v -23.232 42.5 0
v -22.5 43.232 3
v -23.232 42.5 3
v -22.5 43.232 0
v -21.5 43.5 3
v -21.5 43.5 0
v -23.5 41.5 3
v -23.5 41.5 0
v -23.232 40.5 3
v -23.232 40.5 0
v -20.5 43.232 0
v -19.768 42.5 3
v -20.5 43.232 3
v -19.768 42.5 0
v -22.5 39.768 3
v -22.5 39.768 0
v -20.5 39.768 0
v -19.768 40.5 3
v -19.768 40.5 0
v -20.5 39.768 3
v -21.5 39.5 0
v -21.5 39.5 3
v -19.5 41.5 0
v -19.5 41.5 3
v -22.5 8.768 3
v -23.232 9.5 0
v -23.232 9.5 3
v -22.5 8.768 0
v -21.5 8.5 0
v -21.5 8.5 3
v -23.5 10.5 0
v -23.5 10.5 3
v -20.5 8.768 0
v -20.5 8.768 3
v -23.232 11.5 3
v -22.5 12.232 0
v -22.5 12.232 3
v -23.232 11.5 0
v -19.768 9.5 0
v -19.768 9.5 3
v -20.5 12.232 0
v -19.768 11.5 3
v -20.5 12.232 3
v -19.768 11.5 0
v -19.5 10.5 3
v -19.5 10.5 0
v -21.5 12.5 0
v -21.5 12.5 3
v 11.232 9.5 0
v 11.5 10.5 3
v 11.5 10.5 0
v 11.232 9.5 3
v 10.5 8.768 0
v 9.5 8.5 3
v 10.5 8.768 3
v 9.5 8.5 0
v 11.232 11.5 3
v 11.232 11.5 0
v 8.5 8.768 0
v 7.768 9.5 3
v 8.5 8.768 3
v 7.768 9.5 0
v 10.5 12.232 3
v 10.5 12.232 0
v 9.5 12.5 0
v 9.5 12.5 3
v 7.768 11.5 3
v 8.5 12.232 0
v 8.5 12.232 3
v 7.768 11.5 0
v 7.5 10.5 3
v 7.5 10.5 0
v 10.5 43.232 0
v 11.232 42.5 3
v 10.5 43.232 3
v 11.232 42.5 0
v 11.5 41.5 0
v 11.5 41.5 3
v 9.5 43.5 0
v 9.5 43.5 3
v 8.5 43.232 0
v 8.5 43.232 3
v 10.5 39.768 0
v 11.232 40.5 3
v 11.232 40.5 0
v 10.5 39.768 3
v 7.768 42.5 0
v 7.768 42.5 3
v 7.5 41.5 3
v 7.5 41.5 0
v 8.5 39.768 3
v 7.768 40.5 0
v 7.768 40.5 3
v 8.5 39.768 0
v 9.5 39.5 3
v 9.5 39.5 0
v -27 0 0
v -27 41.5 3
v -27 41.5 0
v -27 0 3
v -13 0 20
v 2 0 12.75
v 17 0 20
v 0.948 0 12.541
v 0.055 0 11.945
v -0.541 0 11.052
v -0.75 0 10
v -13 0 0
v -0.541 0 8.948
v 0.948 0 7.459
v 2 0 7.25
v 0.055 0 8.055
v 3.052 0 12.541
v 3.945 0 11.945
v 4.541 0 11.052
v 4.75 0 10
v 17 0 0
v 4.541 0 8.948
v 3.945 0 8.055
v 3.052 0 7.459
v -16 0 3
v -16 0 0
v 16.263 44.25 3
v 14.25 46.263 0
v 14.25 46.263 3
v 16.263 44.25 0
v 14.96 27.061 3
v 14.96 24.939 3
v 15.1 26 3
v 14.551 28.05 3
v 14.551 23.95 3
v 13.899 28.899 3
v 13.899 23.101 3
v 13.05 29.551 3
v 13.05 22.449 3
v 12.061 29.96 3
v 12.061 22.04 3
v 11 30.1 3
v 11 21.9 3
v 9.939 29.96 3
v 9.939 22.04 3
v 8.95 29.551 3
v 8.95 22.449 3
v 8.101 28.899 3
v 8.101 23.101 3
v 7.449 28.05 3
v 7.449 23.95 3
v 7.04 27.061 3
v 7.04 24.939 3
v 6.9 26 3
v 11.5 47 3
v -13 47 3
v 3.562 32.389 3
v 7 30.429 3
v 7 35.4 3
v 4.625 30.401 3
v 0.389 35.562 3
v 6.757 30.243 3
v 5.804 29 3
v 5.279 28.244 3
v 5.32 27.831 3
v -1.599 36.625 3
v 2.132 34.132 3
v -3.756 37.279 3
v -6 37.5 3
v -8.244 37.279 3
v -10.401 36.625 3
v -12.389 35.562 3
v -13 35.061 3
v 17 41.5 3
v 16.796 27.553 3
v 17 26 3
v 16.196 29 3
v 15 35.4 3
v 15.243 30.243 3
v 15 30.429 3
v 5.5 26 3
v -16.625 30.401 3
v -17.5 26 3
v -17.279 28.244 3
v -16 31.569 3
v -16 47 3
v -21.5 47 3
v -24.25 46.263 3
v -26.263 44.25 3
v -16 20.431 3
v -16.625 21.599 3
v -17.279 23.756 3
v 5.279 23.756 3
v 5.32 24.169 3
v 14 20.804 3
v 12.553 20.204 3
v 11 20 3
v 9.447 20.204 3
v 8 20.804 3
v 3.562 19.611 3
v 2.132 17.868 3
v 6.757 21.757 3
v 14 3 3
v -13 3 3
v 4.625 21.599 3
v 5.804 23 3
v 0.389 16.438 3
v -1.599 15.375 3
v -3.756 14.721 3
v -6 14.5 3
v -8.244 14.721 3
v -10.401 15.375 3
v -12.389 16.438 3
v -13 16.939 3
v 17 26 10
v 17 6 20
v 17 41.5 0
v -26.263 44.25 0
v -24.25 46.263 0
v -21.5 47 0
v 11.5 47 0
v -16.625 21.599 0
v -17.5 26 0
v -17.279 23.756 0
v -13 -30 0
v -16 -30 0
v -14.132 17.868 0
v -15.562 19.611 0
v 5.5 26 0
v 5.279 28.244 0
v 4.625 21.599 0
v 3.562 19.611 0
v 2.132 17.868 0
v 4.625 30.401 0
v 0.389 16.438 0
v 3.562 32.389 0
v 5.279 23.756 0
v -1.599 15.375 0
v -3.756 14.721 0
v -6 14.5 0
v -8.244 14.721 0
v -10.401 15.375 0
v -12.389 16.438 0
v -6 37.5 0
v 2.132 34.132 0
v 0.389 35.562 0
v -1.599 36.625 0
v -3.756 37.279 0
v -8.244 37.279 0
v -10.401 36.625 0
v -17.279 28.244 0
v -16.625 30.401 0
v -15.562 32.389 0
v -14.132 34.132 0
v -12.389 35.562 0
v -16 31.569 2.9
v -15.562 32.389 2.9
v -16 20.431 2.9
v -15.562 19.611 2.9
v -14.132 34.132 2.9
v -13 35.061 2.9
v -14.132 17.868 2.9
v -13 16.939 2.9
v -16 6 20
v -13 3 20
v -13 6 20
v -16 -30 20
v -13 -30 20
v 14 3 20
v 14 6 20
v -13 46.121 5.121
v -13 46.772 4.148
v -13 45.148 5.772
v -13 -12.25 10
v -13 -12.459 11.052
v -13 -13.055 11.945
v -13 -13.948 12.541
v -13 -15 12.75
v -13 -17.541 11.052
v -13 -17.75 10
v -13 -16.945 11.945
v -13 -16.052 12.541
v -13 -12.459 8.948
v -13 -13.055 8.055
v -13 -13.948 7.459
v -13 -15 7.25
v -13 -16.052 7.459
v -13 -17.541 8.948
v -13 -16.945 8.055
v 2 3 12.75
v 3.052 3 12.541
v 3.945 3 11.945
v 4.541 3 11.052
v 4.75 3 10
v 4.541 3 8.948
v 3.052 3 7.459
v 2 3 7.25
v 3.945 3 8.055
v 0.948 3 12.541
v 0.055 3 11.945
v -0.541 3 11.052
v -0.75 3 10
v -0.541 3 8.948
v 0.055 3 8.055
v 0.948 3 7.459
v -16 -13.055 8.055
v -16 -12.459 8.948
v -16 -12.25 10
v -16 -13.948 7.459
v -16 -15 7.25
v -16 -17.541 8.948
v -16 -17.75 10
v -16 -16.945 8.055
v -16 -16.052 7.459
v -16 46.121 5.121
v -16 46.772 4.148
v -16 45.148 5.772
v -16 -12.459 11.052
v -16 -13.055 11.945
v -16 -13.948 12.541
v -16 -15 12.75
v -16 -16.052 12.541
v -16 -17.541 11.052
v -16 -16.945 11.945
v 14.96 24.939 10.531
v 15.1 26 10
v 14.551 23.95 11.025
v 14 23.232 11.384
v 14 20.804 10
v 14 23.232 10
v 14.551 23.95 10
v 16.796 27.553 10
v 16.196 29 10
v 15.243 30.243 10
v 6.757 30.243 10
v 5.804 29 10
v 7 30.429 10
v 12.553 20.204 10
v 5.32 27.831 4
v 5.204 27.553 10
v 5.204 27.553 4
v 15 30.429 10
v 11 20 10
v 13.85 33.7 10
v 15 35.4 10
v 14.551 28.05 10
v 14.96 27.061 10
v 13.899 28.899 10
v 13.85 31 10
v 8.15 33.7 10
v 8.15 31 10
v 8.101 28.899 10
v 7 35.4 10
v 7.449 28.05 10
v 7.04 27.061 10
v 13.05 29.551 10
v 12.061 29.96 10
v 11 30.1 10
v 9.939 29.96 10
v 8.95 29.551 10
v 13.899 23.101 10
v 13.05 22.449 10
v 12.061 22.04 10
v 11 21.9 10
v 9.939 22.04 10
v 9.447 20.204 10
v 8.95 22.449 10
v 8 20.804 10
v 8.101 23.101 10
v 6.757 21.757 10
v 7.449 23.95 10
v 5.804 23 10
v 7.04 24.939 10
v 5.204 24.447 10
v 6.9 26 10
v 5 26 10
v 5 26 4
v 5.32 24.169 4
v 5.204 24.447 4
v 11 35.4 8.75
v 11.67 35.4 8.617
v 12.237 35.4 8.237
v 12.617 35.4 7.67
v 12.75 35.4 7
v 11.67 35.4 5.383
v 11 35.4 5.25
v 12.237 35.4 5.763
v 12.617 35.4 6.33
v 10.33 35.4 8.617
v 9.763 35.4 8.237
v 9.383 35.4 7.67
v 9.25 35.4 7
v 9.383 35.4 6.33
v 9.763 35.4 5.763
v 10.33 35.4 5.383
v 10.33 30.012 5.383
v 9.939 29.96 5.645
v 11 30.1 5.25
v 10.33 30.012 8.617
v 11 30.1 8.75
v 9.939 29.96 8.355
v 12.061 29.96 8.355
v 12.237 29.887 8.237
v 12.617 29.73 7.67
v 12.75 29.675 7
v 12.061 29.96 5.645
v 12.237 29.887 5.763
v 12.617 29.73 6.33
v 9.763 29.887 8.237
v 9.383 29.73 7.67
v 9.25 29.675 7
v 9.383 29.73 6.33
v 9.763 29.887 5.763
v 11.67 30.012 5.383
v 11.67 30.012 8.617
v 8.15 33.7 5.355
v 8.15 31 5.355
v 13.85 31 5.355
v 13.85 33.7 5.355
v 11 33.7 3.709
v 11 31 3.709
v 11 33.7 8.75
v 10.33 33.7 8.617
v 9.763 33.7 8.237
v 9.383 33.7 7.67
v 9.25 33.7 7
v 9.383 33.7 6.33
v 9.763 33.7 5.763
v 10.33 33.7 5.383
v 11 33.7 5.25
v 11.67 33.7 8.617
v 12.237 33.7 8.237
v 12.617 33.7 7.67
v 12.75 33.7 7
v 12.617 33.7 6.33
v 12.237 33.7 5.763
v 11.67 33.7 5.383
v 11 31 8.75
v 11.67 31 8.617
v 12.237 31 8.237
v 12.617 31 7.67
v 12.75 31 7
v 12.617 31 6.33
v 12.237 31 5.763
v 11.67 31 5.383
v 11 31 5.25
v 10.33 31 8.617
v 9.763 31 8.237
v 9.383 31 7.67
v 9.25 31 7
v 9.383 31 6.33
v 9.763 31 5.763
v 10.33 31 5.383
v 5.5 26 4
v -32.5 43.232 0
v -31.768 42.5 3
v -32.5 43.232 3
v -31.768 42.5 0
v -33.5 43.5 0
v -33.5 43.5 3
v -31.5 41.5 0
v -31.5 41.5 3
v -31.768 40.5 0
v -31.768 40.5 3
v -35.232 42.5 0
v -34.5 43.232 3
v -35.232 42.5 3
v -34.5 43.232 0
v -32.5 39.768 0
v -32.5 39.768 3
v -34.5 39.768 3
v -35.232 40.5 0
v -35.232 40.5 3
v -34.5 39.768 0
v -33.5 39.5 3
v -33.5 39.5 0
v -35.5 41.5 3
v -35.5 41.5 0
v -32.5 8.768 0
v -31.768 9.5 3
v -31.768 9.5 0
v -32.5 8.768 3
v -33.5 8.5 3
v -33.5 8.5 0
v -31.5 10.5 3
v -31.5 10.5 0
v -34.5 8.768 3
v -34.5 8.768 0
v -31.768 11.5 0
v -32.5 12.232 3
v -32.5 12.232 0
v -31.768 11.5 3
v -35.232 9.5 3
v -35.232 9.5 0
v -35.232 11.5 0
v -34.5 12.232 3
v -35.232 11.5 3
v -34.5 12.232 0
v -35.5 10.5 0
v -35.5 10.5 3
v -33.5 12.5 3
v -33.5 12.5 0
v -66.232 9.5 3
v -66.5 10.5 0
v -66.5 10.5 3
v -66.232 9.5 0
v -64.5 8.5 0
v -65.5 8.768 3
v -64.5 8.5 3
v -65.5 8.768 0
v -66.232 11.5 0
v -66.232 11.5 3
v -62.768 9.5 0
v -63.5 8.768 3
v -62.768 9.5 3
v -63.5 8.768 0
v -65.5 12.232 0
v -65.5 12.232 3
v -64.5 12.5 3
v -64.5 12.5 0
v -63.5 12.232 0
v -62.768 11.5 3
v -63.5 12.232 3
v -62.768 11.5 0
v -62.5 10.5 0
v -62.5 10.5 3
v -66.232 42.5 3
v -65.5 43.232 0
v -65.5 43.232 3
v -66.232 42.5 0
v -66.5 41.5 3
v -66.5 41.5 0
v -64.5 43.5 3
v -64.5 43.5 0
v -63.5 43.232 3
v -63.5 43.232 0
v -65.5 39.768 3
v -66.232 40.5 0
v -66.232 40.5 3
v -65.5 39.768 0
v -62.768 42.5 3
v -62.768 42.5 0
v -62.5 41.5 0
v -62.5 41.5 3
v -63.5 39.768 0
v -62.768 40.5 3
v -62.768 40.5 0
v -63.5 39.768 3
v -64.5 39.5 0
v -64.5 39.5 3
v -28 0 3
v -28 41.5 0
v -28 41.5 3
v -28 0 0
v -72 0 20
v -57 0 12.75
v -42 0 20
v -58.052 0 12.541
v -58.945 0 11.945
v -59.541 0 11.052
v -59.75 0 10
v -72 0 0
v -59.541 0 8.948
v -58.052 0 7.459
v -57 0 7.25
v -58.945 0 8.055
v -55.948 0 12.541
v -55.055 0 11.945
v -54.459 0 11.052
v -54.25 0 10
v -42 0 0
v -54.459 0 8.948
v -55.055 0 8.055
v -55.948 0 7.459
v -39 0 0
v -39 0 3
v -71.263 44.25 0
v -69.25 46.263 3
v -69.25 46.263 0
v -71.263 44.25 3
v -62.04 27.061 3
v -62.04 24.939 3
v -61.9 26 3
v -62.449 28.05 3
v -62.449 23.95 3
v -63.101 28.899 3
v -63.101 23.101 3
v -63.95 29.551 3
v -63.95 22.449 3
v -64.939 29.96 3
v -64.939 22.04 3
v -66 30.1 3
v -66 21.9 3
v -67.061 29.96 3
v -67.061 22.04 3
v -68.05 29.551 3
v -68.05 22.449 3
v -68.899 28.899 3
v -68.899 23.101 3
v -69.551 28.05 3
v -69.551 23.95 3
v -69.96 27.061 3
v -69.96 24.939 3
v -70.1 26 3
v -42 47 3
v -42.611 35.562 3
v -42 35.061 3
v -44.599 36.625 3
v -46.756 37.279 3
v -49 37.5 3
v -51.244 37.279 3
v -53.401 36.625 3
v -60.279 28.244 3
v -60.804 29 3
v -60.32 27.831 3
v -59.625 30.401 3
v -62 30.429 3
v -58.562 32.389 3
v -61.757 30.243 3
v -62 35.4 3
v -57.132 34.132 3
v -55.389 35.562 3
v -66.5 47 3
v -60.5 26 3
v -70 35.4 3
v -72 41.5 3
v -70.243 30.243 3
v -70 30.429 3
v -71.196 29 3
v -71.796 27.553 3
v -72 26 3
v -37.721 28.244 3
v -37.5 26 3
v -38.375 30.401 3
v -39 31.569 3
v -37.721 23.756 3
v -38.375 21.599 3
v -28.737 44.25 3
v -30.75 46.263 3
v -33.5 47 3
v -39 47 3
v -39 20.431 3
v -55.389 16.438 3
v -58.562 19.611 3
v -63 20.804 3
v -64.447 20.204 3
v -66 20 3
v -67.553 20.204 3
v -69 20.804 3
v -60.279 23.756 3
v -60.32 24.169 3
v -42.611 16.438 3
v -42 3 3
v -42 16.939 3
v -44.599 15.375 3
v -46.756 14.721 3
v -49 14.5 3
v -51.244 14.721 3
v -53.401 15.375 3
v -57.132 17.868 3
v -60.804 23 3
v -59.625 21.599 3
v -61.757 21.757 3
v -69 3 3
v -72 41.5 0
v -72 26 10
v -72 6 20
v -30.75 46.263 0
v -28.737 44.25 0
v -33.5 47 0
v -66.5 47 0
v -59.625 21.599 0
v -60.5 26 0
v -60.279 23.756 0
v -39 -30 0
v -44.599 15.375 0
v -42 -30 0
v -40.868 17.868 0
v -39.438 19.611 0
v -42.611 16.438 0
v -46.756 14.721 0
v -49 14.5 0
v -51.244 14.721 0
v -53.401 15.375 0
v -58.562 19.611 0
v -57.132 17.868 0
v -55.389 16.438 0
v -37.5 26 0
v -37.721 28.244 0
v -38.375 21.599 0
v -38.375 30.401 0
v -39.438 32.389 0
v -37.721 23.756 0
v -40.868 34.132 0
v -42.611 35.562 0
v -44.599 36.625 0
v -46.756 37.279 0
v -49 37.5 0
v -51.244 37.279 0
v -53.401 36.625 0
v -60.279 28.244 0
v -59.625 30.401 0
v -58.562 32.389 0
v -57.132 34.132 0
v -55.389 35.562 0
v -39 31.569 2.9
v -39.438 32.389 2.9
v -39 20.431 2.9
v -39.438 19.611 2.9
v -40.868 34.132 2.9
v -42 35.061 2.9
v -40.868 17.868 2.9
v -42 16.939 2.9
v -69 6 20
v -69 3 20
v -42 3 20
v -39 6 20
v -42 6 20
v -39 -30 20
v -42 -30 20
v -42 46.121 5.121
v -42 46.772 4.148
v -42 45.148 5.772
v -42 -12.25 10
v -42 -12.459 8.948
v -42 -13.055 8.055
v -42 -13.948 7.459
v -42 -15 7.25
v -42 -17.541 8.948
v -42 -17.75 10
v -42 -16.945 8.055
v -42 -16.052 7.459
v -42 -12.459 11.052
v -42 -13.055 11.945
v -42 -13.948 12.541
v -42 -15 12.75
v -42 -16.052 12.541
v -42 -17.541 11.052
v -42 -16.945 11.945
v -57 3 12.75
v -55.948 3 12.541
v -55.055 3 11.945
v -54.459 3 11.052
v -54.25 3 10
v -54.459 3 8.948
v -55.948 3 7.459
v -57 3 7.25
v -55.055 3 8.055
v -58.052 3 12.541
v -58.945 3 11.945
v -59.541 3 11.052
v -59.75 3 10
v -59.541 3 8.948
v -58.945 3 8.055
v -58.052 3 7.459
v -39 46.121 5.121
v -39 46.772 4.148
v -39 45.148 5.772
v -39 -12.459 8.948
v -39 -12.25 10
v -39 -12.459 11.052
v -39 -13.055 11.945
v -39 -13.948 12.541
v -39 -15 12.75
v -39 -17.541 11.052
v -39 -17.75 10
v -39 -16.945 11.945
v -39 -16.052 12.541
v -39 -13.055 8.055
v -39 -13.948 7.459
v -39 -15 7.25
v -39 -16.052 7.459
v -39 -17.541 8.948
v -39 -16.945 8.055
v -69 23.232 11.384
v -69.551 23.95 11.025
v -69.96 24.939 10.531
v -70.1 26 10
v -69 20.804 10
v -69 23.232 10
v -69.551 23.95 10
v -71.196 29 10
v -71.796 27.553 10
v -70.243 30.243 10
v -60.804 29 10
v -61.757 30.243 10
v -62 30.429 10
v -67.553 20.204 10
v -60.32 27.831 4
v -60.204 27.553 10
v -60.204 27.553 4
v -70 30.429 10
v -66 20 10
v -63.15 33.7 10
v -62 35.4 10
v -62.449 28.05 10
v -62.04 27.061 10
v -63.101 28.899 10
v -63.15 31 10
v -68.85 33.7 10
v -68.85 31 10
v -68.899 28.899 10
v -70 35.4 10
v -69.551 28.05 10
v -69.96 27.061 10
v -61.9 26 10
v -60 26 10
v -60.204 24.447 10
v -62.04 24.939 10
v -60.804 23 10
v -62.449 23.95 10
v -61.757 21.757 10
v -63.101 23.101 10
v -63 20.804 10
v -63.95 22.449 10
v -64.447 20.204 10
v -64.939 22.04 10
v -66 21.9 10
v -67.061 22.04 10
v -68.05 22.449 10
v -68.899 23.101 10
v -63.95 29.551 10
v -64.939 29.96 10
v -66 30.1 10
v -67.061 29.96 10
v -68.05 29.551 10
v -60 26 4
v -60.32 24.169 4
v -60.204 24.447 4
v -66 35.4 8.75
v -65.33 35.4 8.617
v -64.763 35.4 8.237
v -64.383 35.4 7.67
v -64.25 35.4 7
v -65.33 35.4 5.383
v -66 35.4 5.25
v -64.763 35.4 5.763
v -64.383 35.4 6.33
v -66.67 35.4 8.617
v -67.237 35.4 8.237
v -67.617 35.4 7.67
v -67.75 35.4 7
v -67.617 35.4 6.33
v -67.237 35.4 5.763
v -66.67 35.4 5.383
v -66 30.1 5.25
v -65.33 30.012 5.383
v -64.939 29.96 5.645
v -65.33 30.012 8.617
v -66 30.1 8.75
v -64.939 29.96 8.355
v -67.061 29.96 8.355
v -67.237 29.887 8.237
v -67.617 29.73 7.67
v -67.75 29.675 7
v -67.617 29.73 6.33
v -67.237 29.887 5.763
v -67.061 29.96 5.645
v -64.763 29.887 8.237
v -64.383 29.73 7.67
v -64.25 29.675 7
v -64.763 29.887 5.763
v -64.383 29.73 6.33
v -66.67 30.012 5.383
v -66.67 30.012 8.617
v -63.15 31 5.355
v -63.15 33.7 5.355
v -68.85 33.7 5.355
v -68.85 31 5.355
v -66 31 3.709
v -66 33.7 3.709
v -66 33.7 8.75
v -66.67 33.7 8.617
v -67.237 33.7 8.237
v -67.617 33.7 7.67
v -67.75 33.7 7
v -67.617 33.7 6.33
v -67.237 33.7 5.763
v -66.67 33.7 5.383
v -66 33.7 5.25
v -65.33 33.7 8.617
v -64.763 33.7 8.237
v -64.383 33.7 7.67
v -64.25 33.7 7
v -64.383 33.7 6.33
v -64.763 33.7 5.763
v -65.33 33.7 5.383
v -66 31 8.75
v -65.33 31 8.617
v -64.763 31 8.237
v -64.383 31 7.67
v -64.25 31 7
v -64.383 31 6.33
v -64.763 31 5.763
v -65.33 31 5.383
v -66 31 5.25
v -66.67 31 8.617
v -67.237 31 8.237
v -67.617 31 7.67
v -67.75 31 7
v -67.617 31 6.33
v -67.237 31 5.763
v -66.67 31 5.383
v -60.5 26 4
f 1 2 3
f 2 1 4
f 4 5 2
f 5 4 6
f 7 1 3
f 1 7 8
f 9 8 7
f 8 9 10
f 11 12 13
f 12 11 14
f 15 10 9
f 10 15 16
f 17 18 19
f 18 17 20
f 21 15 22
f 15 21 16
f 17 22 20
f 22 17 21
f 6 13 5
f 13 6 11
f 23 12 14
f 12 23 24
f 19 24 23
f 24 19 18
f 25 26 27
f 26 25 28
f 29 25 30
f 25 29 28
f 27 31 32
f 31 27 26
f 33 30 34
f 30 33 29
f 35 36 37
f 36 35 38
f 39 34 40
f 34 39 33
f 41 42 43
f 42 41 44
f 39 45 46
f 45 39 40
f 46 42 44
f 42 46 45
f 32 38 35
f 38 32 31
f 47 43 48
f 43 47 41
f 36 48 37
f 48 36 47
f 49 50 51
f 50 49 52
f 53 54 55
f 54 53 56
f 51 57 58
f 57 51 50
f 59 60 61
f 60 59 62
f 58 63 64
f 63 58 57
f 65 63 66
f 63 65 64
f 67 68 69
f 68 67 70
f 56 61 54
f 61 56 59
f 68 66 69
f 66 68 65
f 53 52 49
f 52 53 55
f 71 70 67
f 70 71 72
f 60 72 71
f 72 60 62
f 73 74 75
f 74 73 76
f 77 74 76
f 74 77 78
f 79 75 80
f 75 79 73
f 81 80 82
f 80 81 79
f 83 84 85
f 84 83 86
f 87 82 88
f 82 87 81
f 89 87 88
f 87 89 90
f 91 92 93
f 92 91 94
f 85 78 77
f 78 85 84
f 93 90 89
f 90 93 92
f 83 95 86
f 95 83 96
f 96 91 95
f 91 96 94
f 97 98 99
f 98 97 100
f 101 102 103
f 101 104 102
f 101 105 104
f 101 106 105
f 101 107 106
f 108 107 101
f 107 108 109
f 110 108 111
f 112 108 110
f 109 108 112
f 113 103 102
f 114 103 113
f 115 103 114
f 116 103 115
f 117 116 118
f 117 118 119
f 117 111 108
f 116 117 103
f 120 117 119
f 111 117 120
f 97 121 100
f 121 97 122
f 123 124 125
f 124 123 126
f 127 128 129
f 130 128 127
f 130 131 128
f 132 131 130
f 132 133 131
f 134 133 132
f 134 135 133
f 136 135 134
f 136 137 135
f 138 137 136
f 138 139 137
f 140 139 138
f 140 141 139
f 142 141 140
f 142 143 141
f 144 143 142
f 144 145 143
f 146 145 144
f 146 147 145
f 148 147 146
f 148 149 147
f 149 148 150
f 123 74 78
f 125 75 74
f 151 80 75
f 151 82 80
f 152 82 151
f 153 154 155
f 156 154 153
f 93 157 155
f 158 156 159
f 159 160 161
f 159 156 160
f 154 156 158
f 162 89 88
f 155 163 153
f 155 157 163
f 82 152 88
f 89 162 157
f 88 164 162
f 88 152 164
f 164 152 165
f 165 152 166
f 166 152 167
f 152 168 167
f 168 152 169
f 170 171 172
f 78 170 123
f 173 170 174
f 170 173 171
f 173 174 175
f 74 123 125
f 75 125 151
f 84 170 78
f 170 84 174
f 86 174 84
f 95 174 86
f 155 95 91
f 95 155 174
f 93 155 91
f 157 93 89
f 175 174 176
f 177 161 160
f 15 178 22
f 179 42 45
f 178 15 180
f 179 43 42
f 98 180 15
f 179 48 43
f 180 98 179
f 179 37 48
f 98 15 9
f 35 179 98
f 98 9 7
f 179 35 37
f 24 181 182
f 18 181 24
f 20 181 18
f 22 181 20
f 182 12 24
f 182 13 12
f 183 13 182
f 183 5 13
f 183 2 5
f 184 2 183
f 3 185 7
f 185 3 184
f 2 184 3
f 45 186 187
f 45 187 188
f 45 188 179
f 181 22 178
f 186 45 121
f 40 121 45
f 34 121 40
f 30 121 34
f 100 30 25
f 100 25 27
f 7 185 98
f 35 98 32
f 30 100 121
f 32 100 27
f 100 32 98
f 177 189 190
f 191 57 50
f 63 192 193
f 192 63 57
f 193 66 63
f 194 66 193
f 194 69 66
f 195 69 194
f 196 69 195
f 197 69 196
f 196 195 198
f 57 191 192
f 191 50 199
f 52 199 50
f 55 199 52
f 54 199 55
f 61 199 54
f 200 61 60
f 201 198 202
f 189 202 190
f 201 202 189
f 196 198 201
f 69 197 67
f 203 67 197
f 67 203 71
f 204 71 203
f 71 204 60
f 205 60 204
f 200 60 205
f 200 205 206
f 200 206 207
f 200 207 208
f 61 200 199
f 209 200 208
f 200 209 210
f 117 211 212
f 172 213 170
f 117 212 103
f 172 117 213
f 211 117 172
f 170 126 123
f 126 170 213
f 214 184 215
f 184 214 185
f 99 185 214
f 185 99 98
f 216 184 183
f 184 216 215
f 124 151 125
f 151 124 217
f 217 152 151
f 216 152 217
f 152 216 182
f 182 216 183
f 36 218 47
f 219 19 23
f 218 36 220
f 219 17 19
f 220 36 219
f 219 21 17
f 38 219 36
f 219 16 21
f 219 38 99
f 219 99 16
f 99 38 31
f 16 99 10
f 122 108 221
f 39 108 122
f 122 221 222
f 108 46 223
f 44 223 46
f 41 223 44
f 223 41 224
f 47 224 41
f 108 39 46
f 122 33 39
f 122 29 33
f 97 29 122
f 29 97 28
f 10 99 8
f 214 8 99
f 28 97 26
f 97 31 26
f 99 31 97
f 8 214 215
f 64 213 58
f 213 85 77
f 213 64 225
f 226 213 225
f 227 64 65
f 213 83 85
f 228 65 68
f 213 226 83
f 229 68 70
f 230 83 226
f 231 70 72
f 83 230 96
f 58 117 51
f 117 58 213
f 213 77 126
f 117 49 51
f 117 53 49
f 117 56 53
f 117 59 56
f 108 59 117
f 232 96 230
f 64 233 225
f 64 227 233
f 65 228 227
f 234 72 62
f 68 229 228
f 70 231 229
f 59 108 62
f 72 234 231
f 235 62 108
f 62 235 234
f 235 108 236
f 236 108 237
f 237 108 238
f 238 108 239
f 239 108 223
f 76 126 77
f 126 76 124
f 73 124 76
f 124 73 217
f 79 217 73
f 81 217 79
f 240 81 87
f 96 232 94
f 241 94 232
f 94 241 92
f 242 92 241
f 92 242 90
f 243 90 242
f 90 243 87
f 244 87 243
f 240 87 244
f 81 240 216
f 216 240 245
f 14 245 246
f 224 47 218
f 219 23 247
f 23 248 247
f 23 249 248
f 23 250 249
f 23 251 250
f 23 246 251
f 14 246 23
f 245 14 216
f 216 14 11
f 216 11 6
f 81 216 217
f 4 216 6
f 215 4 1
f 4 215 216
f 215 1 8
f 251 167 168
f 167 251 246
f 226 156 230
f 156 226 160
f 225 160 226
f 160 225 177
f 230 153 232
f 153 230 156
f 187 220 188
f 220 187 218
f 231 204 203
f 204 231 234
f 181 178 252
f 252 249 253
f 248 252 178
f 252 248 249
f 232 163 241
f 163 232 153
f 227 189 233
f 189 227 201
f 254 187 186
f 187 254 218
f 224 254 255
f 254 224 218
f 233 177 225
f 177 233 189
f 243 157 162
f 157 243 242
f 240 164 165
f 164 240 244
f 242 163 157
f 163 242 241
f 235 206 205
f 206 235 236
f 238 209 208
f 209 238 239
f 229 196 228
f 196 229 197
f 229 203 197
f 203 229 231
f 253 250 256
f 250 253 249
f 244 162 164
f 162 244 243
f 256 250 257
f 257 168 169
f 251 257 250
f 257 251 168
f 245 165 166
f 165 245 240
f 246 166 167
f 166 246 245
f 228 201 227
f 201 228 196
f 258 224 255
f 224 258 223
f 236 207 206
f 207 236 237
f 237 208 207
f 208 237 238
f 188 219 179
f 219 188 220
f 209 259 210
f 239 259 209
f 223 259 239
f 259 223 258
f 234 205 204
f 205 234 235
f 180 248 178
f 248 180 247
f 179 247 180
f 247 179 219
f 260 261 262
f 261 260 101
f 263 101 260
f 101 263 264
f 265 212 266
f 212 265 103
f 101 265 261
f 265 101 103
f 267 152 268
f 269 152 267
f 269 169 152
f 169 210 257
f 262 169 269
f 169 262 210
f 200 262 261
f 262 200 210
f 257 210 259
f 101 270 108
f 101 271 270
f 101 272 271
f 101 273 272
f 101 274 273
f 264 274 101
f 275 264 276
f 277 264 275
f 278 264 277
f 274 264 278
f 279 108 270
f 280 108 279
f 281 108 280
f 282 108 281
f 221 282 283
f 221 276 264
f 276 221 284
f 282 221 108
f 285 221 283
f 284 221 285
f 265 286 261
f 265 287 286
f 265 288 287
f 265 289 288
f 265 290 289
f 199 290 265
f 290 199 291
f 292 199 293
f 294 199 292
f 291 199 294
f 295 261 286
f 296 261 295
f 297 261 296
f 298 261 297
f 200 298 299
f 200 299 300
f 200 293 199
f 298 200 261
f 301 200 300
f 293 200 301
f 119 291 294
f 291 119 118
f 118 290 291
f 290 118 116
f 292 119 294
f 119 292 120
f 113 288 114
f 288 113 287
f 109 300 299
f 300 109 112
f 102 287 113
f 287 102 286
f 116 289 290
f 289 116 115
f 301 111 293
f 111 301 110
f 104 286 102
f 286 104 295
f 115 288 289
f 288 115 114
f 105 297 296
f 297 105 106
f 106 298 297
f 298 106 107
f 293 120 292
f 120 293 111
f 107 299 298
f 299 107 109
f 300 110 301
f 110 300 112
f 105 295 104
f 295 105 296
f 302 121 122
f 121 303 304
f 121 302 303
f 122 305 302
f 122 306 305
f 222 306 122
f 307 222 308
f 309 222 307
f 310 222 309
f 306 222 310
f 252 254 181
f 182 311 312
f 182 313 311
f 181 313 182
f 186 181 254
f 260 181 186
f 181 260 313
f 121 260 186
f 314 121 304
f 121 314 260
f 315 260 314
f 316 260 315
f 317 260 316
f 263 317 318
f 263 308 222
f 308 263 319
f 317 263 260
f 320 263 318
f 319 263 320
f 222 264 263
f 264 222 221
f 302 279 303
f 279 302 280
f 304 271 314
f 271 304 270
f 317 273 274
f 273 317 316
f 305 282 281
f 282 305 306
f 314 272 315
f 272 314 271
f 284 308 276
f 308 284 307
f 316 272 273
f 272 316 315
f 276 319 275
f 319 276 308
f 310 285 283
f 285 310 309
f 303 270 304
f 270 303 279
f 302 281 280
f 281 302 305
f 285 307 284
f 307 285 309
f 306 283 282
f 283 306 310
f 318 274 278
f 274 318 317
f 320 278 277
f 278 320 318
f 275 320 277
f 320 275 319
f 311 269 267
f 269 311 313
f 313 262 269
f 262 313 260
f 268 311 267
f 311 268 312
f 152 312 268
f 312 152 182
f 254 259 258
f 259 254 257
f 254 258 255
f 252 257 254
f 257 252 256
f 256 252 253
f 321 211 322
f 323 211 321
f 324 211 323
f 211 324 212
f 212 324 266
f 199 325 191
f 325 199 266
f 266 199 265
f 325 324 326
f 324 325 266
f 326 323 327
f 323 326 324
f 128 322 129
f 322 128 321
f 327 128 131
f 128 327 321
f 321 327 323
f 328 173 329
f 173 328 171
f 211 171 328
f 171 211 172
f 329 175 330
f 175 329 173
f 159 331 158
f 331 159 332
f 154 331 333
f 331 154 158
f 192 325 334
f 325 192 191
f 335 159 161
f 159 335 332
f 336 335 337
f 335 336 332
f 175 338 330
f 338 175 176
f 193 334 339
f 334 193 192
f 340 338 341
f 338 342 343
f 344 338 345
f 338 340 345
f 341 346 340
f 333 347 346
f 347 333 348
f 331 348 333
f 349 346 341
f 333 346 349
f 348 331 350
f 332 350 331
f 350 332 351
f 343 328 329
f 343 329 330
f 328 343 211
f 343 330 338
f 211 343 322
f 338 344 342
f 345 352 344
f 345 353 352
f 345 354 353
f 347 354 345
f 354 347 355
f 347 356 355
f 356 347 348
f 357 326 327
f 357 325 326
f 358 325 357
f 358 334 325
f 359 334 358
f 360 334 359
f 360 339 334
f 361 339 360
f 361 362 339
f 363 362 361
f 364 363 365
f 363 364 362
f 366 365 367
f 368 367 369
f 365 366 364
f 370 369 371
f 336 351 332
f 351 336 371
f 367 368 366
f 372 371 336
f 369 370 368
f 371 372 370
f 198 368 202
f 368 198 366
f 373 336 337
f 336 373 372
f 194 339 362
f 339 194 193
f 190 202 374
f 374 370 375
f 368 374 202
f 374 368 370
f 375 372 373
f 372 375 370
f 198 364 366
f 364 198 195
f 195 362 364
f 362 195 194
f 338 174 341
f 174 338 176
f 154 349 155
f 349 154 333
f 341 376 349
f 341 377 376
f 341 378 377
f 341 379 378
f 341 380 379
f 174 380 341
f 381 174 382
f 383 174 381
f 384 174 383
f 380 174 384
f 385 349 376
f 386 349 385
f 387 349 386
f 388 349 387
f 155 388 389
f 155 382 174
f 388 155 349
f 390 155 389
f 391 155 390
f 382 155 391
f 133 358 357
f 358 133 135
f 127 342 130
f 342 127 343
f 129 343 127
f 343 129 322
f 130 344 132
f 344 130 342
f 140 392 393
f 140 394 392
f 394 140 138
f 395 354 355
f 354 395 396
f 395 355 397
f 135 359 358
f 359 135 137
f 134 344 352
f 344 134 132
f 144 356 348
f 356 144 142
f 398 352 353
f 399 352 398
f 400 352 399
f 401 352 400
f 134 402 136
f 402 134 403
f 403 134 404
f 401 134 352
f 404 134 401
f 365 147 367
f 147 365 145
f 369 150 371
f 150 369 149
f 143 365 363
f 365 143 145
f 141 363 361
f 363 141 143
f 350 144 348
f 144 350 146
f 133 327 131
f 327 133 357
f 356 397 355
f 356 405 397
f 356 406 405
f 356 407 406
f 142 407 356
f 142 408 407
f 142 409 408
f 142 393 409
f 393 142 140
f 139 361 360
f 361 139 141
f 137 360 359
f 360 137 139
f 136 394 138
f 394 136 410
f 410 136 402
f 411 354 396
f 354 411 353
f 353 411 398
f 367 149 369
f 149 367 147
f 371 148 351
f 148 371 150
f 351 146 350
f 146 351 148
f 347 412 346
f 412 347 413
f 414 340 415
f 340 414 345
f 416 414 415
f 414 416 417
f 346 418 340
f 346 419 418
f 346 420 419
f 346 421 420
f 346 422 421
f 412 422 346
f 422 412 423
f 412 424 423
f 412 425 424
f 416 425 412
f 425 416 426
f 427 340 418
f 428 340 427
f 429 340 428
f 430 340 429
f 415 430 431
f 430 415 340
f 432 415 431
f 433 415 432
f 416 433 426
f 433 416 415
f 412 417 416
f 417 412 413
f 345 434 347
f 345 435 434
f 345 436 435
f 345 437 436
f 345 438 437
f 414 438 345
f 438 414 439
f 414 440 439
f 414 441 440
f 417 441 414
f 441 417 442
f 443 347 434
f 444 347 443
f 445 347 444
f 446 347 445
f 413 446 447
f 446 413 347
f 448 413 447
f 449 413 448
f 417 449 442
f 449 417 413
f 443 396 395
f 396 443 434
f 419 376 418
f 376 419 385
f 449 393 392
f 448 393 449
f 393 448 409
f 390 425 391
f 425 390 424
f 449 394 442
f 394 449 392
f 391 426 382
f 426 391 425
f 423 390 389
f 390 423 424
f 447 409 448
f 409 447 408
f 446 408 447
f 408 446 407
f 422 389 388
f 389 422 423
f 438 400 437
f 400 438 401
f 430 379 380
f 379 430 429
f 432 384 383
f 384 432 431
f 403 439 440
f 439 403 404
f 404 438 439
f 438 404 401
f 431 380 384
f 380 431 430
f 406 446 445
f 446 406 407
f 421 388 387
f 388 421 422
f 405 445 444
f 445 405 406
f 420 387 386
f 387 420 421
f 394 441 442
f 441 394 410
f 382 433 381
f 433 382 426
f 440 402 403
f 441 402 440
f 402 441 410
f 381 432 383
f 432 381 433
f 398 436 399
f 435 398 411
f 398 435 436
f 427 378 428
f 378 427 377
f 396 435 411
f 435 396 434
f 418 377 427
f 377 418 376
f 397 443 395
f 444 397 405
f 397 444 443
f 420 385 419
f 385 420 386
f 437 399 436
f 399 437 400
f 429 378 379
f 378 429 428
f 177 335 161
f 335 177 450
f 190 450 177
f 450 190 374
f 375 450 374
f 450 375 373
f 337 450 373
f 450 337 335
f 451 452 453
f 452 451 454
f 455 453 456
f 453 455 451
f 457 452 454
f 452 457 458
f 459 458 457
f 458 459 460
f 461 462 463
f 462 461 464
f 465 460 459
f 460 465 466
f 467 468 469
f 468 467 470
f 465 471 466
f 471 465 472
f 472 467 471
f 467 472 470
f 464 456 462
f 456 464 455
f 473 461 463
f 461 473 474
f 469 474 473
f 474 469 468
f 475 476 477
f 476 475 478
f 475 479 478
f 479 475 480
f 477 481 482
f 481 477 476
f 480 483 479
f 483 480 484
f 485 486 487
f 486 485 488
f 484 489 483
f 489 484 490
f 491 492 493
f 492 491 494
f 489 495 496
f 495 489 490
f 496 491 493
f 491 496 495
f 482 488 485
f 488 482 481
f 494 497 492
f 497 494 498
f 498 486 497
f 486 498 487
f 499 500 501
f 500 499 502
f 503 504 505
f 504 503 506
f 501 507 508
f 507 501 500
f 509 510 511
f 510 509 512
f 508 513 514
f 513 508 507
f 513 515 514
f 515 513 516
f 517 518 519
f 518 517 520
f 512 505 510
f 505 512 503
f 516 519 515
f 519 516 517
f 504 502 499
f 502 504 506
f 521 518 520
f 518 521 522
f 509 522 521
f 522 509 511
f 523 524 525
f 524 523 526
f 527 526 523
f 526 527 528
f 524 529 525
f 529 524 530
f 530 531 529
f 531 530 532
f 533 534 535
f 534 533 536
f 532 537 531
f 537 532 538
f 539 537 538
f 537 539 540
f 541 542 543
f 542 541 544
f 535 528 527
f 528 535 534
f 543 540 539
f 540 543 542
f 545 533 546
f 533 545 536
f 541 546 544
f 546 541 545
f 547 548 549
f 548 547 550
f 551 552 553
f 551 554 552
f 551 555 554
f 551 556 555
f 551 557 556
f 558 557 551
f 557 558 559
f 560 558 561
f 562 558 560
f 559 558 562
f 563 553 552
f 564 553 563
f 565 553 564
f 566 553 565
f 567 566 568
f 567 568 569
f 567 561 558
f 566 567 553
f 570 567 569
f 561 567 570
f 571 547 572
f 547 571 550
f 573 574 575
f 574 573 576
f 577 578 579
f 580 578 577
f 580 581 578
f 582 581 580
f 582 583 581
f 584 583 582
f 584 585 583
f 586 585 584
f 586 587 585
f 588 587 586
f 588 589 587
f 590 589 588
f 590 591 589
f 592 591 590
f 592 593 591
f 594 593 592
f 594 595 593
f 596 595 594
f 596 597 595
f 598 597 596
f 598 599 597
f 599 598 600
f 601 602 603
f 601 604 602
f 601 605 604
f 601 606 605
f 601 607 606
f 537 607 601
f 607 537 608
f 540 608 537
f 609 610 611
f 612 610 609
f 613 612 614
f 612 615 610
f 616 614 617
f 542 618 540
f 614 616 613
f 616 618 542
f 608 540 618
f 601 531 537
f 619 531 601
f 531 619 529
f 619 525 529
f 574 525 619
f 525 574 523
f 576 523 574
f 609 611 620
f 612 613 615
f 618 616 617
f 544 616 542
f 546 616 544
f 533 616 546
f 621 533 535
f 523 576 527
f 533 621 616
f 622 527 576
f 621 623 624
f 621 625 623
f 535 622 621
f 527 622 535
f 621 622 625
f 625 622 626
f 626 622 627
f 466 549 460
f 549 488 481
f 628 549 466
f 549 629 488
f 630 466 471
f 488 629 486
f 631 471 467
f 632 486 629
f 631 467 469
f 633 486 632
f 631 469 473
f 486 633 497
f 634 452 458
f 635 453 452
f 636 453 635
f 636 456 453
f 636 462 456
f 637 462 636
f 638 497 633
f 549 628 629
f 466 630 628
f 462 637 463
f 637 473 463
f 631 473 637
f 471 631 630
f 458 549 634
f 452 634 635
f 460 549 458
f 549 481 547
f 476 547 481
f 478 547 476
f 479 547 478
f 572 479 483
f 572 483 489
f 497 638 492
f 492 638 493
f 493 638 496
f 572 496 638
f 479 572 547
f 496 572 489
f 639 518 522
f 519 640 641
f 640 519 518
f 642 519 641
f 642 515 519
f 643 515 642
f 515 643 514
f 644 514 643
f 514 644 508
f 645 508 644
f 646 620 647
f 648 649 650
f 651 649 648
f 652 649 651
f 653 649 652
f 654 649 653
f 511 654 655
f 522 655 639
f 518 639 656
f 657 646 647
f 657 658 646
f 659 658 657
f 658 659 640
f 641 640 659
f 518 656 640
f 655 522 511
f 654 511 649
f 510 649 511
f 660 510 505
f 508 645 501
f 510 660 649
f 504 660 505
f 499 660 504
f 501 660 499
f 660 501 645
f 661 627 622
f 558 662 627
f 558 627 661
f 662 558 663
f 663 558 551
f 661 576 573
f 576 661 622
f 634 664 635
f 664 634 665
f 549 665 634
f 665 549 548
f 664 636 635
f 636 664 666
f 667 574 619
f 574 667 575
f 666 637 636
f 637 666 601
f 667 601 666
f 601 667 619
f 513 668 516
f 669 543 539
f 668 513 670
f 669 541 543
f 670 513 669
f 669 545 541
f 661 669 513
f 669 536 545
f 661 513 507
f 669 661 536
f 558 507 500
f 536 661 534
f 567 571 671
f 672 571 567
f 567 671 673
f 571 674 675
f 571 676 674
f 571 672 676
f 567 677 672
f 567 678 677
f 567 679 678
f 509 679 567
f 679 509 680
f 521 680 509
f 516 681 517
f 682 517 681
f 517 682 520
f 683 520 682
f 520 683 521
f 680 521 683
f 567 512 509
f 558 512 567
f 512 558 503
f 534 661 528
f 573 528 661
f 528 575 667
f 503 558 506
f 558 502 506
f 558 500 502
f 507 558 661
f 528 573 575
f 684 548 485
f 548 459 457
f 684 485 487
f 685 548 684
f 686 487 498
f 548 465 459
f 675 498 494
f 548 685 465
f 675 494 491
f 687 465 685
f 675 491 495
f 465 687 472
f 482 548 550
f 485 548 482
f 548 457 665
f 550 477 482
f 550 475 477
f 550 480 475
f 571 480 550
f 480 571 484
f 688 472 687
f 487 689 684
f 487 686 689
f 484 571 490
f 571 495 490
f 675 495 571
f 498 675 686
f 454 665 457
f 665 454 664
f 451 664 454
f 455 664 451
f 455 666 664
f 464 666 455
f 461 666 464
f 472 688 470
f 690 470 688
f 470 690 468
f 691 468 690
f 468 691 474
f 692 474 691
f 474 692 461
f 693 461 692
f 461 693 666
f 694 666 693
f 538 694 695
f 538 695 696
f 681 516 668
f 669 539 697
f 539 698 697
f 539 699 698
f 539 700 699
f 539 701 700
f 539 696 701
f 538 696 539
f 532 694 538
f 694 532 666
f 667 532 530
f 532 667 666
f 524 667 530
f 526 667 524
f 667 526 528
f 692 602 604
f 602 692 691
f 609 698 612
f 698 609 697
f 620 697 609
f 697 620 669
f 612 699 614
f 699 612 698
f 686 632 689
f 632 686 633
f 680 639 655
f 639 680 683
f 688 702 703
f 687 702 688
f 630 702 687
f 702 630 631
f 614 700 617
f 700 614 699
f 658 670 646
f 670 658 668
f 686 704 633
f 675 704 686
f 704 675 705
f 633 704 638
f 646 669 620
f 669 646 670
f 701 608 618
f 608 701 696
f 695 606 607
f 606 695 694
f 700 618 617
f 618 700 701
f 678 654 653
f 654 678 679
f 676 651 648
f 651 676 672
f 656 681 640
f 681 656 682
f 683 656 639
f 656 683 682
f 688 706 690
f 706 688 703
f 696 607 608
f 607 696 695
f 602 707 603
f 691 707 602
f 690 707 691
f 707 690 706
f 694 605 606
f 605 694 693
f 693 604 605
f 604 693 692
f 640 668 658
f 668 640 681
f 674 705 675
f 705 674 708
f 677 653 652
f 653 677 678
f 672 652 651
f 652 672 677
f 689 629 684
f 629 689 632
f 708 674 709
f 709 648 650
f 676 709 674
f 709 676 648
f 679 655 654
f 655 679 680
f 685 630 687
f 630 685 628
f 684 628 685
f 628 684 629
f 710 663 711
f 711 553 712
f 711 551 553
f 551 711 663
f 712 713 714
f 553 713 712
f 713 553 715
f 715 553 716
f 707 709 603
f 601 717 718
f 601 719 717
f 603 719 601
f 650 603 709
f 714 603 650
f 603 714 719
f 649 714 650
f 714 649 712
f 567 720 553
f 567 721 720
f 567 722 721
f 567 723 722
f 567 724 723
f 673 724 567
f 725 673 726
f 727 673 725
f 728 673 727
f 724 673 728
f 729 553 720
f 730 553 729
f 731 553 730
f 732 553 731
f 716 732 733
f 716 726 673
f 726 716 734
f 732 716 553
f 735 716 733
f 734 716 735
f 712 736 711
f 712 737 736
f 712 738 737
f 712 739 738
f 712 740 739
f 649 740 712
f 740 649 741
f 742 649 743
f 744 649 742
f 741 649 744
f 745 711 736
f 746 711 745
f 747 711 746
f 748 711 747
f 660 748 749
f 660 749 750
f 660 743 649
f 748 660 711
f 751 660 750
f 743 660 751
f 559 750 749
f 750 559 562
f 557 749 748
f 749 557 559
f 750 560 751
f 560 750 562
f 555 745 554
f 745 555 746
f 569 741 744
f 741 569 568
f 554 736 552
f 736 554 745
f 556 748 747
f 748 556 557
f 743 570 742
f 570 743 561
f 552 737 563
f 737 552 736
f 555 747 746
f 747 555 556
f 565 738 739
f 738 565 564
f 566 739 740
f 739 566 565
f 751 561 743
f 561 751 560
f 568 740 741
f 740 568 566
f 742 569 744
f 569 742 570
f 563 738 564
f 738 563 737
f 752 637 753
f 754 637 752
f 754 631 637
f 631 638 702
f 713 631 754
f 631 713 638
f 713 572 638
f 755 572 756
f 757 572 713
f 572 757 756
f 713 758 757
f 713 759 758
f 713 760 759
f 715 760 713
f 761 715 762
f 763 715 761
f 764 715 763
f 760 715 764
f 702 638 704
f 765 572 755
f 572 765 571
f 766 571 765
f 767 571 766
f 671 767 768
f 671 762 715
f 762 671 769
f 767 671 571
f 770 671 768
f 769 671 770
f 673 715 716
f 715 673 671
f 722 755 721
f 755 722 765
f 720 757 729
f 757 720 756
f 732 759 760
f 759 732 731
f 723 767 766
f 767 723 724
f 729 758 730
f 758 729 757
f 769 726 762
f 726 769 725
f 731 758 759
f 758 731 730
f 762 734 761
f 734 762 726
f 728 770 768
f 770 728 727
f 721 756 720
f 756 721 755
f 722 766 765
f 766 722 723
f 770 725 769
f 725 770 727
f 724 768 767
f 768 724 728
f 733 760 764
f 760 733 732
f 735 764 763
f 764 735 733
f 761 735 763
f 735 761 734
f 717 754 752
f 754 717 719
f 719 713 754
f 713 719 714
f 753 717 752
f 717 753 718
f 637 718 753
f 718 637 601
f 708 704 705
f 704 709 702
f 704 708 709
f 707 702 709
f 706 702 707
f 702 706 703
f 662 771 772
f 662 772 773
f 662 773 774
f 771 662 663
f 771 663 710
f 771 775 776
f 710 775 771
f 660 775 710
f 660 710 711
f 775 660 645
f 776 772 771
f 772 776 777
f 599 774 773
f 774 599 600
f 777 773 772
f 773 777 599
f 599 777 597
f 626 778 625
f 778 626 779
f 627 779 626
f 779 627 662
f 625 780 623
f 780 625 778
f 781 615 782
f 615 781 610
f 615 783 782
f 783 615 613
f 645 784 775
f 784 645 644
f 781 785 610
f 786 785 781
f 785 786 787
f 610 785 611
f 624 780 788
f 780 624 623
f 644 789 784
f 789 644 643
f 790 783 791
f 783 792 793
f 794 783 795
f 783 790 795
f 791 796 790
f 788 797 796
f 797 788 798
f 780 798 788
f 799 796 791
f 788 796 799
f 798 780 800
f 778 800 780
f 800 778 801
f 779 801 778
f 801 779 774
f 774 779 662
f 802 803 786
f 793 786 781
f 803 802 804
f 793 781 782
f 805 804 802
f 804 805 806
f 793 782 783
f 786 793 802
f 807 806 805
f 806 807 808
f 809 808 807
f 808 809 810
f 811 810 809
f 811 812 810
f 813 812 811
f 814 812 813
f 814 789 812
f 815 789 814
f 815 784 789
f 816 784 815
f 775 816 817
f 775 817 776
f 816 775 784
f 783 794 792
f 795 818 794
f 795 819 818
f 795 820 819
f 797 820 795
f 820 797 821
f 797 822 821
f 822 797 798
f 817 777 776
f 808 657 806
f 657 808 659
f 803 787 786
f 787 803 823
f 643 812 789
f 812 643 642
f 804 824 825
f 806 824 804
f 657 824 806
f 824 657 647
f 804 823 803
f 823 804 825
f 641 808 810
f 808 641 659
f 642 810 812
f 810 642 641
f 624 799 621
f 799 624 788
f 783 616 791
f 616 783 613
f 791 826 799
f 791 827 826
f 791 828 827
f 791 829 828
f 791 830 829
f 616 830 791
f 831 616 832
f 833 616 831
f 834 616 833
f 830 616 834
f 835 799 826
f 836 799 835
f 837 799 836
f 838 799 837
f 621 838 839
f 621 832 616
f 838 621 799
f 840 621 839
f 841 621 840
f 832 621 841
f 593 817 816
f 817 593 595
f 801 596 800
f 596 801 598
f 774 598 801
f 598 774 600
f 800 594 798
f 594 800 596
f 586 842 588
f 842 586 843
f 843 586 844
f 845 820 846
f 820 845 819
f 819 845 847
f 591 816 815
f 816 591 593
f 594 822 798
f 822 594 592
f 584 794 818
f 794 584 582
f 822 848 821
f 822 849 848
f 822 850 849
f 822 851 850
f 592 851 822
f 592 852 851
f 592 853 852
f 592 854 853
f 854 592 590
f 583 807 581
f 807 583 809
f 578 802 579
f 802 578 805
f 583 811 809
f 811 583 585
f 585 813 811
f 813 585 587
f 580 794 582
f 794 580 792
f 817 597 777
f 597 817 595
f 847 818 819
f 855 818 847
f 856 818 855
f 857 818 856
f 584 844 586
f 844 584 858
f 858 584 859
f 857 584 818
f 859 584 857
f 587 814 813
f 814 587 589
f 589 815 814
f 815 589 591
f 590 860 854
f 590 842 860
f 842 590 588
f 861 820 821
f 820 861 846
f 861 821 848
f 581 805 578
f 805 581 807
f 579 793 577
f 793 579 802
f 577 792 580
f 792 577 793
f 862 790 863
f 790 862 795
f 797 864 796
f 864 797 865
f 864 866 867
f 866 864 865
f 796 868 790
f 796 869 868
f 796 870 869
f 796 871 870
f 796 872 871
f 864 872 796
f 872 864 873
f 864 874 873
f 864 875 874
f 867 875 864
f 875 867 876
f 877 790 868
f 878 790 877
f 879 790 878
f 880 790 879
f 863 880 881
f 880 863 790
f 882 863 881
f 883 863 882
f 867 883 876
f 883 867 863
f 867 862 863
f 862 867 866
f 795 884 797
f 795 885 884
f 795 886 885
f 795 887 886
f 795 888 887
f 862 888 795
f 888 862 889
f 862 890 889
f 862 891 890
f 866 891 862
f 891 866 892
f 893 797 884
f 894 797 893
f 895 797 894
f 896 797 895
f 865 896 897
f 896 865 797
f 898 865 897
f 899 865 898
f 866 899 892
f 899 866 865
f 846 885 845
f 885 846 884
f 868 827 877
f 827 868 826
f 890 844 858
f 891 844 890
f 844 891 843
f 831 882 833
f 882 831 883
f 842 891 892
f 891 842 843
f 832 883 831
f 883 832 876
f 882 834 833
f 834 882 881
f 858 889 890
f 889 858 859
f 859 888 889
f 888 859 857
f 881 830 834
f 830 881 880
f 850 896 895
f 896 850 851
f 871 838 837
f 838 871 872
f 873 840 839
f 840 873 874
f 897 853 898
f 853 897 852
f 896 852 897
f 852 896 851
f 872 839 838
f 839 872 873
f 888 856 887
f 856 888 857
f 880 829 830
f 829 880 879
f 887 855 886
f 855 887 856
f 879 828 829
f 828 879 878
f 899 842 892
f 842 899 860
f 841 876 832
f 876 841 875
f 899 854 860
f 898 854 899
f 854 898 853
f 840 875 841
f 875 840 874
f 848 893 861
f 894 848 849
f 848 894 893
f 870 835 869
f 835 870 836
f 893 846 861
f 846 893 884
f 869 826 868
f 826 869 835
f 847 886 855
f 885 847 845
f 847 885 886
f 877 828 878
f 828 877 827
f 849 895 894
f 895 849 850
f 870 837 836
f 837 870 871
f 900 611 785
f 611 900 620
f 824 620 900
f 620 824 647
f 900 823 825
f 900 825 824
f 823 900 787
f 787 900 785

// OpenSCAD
// file: modules.scad
// Fonctions personnalisées

//http://forum.openscad.org/Wish-mirror-copy-true-td10681.html
module copy_mirror(vec=[0,1,0])
{
    children();
    mirror(vec) children();
}

module ecrou(plat,h){
  cylinder(d=plat*2/sqrt(3), h=h, $fn=6);
}


module courroie(diam,longueur){
  color ("black")
  difference(){
    hull(){
      cylinder(d=diam+1, h=6, $fn=32);
      translate([longueur,0,0]) cylinder(d=diam+1, h=6, $fn=32);
    }
    translate([0,0,-1])
    hull(){
      cylinder(d=diam-1, h=8, $fn=32);
      translate([longueur,0,0]) cylinder(d=diam-1, h=8, $fn=32);
    }
  }
  
  
}
// file: config.scad
// Paramètres de la machine

decal=-30;            // décallage du chassis xz
hauteur=400;          // hauteur totale chassis
largeur=400;          // largeur totale chassis
longueur=470;         // longueur totale chassis
hauteur_base=90;      // hauteur de la base
entraxe_y=140;        // distance entre les tiges Ø8 axe Y
entraxe_x=45;         // distance entre les tiges Ø8 axe X

couleur=[1,0.6,0];


// Plats écrous
ec3=5.7;
ec4=7.2;
ec5=8.2;
ec6=10.2;

// Jeu sur plats pour les écrous glissants
jec=0.2;

// hauteur écrous
ec3h=2.4;
ec4h=3.2;
ec5h=4.7;
ec6h=5.2;

// Vis
vis3=3.5;
vis4=4.5;
vis5=5.5;
vis6=6.5;


// Paramètre des pièces et jeux

// écart plateau/courroie
// y_belt_holder
belt_h=13;      // écart entre la courroie et le plateau

// écart plateau/tiges lisses
// y_lm8uu
decal_plateau=12; // Décallage en Y

// décallage des tiges lisses Y
// support_tige8_y
decal_tiges=5;

// décallage moteur Y
// y_motor
decal_motory_z=11;
decal_motory_y=25;

// Equerres de fixation position fermée
eq_ec=10;      // écart entre profilés

// Fixations axe Z
pos_z=26;      // position des axes par rapport au profilé (>= 21)
hauteur_z=20;  // hauteur des fixations
entraxe_z=17;  // distance entre les tiges Ø8 et M5
// est ce que la tige de 8 dépasse du profilé de 30?
// si oui, on décale les fixations
decalx=max(-42/2+entraxe_z+8/2+2, 0);

// Roulements linéaires
lbd = 15; // diamètre ext
lbh = 24; // hauteur

// x_carriage
he_x=23;  // entraxe hotend x
he_y=23;  // entraxe hotend y
sen_x=20; // entraxe capteur x
sen_y=23; // entraxe capteur y

// sensor_holder
sen_ep=3;   // épaisseur
sen_d=12.5; // diamètre du capteur
sen_pos=0;  // décentrage en x du capteur
sen_z=7;    // position Z de la bague

// y_belt_idler
ybi_ep1=4;       // épaisseur de la partie fixe
ybi_ep2=4;       // épaisseur de la partie mobile
ybi_h=16;        // position de l'axe
ybi_ec=11;       // écart pour le passage du ou des roulement
ybi_vis=vis4;    // diamètre passage de vis (axe)
ybi_ecrou=ec4;   // plat écrou
ybi_ecrouh=ec4h; // hauteur écrou
ybi_long=60;     // longueur de la partie mobile entre axes
ybi_prof=15;     // largeur de la partie mobile


// nombre de dents des poulies
poulie=20;

// Pas des courroies
pas=2;

// diamètre des poulies
dpoulie=poulie*pas/3.1416;
// main file
// eLKa1
// z_axis_bottom
// GNU GPL v3
// lkiefer <blog.lkiefer.org> and contributors
// http://www.reprap.org/wiki/ELKa
// https://github.com/kimented/elka1

include <config.scad>;
use <modules.scad>;

module z_axis_bottom(){
  echo ("z_axis_bottom");
  ep=3;
  color(couleur)
  translate([-42/2+30/2,pos_z,0]){
    difference(){
      // base
      hull(){
        translate([31/2+decalx,31/2,0]) cylinder(d=(42-31), h=ep, $fn=12);
        translate([-31/2,31/2,0]) cylinder(d=(42-31), h=ep, $fn=12);
        translate([-42/2,-pos_z,0]) cube([42+decalx,1,ep]);
      }
      // trou axe moteur
      translate([0,0,-1]) cylinder(d=23, h=ep+2, $fn=32);
      // trous fix moteur
      for (i=[1:4]) rotate ([0,0,90*i]) translate([31/2,31/2,-1]) cylinder(d=4, h=ep+2, $fn=12);
    }
    // fixation face
    difference(){
      translate([-(30-42/2)+decalx,-pos_z,0]) cube([30,ep,hauteur_z]);
      translate([42/2-30/2+decalx, -pos_z-1,hauteur_z/2]) rotate([-90,0,0]) cylinder(h=ep+2, d=vis5, $fn=16);
    }
    // fixation coté
    difference(){
      translate([42/2-30-ep+decalx,-pos_z-30,0]) cube([ep,30,hauteur_z]);
      translate([42/2-30-ep+decalx-1,-pos_z-30/2,hauteur_z/2]) rotate([0,90,0]) cylinder(d=vis5, h=ep+2, $fn=16);}
    // nervure droite
    translate([-42+30+decalx,0,0])
    difference(){
      hull(){
        translate([0,42/2-ep,ep]) rotate([0,90,0]) cylinder(h=ep, d=2*ep, $fn=16);
        translate([0,-pos_z,0]) cube([ep,ep*2,hauteur_z]);
      }
      translate([-1,-pos_z-1,-1.1]) cube([ep+2, 42/2+pos_z+2, ep+1]);
    }
    translate([42/2+decalx-ep,0,0])
    // nervure gauche
    difference(){
      hull(){
        translate([0,-1,ep]) cube([ep,1,7]);
        translate([0,-pos_z,0]) cube([ep,ep*2,hauteur_z]);
      }
      translate([-1,-pos_z-1,-1.1]) cube([ep+2, 42/2+pos_z+2, ep+1]);
      //trou tige
      translate([-4-2+ep,0,ep]) cylinder(d=8+0.2, h=hauteur, $fn=24);
    }
    // tige 8 + ecrou prisonier
    translate([entraxe_z,0,0])
    difference(){
      union(){
        cylinder(d=8+2*2, h=7+ep, $fn=24);
        translate([-4,0,0]) cube([8,ec3h+8/2+3,7+ep]);
      }
      translate([0,0,ep]) cylinder(d=8+0.2, h=7+1, $fn=24);
      hull(){
        translate([0,8/2+1,ep+8/2]) rotate([-90,90,0]) ecrou(5.7,ec3h+0.3);
        translate([0,8/2+1,ep+8]) rotate([-90,90,0]) ecrou(5.7,ec3h+0.3);
      }
      translate([0,0,ep+8/2]) rotate([-90,90,0]) cylinder(d=vis3, h=8+8, $fn=16);
      // trou axe moteur
      translate([-entraxe_z,0,-1]) cylinder(d=23, h=ep+2, $fn=32);
    }
  }
}

/*module z_axis_bottom_r(){
  mirror([1,0,0]) z_axis_bottom_l();
}*/

z_axis_bottom();
translate([-55,0,0]) mirror([1,0,0]) z_axis_bottom();
